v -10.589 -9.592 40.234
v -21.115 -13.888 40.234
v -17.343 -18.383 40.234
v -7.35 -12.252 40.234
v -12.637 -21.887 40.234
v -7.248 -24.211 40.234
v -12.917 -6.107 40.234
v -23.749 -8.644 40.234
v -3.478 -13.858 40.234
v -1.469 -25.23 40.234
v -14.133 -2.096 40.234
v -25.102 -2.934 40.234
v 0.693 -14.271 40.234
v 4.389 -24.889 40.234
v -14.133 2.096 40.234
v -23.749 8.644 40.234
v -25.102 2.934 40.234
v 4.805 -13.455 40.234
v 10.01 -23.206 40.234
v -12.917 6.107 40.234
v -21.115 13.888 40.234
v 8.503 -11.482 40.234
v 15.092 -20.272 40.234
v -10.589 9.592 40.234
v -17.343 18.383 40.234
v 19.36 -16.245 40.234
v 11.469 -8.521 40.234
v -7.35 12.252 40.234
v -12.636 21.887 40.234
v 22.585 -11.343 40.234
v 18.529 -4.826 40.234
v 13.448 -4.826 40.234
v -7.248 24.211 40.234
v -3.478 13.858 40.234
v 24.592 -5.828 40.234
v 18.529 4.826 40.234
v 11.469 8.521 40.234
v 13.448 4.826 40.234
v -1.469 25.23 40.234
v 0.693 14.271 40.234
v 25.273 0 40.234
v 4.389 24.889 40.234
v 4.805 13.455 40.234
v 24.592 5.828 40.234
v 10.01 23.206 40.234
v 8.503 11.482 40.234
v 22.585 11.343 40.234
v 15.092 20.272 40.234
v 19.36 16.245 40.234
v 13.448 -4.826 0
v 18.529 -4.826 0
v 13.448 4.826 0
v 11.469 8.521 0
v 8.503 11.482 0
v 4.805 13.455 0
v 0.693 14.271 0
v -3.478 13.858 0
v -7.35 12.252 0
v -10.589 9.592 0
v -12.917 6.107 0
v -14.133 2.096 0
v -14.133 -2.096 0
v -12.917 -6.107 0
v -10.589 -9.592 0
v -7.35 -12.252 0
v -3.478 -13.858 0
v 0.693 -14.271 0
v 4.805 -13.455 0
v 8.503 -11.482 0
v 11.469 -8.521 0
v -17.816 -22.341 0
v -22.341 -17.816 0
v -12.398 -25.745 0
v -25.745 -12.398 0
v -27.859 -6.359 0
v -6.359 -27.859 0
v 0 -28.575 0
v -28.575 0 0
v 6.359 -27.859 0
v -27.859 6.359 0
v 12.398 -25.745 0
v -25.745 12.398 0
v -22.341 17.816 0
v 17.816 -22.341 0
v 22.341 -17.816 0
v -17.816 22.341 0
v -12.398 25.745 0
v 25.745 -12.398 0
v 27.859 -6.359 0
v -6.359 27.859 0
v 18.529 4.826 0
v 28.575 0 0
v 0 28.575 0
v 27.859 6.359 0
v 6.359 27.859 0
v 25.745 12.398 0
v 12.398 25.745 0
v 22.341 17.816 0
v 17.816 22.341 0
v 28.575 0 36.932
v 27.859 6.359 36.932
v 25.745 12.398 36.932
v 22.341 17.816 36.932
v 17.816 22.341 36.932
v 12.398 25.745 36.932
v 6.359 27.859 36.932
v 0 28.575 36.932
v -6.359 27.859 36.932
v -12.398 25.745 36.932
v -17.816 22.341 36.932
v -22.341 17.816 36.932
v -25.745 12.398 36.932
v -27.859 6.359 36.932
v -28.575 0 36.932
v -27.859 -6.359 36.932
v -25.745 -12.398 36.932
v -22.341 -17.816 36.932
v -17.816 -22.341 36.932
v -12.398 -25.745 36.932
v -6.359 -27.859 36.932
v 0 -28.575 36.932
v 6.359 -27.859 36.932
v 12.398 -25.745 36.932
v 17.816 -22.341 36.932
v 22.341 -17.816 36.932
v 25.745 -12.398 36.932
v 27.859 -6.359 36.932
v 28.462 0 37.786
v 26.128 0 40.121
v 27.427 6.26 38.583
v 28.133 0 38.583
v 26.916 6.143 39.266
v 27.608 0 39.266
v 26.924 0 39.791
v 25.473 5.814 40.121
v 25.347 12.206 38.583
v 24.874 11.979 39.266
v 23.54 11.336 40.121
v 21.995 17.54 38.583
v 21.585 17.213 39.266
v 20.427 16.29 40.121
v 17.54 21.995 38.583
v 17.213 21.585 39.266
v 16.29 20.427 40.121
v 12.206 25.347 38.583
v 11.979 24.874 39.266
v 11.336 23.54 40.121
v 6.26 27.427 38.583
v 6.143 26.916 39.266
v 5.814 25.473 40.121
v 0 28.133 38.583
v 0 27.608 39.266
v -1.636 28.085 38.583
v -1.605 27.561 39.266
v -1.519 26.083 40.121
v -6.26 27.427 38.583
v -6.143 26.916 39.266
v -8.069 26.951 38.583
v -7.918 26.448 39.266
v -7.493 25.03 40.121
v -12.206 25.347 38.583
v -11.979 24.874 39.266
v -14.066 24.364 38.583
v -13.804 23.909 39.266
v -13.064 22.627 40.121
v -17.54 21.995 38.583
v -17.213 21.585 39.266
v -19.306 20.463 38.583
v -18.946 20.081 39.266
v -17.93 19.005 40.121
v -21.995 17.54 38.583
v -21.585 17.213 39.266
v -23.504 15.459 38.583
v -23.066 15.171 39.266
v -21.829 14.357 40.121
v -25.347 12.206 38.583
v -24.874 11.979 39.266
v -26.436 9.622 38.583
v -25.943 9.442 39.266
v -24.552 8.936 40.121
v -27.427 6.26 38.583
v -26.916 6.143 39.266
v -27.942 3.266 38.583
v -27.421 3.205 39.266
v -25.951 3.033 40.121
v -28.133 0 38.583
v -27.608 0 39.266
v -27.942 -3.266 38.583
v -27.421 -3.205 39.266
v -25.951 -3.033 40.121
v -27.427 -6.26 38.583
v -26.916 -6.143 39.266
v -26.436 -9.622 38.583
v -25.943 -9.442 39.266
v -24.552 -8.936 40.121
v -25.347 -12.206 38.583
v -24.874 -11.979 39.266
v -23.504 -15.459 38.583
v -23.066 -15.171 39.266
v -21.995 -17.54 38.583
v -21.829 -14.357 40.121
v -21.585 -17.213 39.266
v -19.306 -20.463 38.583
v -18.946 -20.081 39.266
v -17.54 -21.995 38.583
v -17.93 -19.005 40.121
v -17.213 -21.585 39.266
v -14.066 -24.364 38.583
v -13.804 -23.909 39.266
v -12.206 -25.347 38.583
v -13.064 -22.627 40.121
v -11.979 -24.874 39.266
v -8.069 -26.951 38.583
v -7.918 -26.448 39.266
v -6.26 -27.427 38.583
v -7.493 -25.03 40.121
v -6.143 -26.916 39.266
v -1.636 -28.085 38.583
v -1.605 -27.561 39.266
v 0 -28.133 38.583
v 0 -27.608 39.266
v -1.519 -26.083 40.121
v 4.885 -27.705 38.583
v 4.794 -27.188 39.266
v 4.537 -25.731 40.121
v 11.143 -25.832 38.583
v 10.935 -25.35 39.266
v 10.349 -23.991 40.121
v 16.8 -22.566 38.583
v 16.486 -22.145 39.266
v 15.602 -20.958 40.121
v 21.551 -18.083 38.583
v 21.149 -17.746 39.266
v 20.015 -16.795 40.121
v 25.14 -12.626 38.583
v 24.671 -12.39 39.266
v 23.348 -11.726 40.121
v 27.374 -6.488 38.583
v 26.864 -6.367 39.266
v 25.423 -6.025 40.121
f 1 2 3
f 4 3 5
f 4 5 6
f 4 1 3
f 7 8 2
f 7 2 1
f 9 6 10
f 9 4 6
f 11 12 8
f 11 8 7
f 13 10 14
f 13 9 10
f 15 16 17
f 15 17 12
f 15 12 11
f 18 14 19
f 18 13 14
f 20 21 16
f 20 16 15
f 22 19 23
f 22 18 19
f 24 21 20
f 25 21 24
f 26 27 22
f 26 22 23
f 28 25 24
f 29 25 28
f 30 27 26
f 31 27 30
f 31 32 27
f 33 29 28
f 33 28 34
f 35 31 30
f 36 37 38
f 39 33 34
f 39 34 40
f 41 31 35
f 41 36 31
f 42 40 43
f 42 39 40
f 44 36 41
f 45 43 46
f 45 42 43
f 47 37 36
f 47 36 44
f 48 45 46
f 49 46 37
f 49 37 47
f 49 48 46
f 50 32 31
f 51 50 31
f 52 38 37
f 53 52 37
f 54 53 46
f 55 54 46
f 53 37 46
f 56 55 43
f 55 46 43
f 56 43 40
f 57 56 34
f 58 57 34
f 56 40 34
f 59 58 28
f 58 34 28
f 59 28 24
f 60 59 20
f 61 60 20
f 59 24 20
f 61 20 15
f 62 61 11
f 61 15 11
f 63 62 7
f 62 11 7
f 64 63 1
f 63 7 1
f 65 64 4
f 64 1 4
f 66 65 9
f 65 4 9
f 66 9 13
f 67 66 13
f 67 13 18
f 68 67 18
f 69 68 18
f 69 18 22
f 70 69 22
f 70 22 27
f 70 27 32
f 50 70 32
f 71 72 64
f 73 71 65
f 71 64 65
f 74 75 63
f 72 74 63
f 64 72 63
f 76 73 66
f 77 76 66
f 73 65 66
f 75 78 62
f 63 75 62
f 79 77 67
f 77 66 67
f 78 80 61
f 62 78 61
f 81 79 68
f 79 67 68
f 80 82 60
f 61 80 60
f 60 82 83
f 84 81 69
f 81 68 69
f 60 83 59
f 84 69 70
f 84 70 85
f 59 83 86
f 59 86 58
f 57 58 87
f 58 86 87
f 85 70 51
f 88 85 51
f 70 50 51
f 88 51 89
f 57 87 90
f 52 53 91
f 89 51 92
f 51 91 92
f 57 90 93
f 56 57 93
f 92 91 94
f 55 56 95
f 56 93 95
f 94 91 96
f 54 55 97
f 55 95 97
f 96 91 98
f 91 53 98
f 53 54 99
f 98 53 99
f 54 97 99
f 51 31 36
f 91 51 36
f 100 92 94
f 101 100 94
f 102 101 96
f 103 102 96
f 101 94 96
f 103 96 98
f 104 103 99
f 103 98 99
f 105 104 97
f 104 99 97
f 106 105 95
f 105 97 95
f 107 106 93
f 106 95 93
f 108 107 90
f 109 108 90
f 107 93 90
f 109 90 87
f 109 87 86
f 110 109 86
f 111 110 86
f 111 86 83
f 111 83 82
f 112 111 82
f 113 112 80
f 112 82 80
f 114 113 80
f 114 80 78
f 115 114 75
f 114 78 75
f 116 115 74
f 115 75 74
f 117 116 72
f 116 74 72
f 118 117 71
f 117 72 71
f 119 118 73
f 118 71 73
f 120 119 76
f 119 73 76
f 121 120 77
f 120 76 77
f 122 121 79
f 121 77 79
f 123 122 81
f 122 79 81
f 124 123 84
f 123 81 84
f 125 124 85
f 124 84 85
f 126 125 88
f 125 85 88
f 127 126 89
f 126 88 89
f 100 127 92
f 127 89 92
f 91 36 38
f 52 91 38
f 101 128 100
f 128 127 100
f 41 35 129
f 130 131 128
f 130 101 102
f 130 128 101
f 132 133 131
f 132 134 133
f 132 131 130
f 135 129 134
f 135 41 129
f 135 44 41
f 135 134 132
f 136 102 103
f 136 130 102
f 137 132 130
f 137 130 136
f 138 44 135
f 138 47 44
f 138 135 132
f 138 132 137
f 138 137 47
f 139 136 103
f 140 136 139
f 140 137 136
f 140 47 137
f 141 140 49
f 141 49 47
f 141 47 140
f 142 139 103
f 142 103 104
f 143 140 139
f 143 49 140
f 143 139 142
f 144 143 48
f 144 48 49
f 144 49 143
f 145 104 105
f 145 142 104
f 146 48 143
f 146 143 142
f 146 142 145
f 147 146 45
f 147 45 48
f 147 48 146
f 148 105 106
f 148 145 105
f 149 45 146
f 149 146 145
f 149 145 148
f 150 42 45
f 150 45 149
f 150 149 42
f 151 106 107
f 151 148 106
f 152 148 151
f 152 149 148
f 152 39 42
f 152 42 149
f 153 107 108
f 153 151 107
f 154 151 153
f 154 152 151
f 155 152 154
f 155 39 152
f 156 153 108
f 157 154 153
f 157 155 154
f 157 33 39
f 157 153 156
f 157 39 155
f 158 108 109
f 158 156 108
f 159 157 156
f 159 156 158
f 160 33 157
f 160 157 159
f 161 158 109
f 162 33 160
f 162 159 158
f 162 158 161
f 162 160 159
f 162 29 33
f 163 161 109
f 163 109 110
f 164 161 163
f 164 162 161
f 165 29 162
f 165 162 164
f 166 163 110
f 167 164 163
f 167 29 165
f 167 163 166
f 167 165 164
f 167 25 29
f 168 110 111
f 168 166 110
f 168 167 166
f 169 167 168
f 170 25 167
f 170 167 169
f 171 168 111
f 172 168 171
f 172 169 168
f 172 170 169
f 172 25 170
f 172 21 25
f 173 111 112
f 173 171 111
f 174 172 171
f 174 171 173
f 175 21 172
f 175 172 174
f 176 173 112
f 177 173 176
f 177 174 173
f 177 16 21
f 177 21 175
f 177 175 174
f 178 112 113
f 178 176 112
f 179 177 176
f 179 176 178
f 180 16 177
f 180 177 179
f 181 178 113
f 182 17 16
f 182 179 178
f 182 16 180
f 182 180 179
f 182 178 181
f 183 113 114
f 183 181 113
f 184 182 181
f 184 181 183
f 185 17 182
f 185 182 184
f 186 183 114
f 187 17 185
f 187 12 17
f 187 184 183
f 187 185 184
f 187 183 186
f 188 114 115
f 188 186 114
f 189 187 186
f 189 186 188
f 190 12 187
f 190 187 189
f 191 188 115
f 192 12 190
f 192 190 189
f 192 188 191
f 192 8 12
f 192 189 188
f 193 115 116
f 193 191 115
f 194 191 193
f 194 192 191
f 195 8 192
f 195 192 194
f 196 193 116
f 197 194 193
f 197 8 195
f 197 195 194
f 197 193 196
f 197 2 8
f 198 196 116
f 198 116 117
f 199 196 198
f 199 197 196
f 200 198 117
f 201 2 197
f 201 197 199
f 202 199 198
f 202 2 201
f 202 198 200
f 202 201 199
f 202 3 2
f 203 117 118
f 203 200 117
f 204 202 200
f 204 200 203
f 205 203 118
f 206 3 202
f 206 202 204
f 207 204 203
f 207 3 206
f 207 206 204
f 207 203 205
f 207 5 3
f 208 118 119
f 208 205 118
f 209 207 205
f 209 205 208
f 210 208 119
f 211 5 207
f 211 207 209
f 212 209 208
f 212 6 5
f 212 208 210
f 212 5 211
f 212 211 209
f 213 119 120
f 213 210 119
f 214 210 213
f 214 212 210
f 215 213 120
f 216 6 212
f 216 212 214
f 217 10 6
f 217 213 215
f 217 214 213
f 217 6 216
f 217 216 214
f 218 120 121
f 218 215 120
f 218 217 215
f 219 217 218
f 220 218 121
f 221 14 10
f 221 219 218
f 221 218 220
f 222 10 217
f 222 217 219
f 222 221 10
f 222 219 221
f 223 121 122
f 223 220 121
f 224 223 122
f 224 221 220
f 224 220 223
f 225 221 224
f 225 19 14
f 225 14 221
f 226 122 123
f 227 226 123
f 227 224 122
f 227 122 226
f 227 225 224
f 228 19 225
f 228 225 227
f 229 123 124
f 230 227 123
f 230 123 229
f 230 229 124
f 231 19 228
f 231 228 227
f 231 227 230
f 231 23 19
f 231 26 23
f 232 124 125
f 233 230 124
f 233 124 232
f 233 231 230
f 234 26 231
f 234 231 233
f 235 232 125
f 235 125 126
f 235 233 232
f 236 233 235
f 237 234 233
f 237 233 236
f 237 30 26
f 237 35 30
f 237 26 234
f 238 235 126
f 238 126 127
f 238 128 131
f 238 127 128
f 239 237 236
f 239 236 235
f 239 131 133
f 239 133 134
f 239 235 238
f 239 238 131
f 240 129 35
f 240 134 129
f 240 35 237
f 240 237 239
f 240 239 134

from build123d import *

# Parameters (mm, degrees)
F0_R     = 28.575
F1_DEPTH = 40.2336
F2_R     = 3.302
F4_DEPTH = 40.2336


with BuildPart() as f1:
    # F0 (on Top) → F1 (new body)
    with BuildSketch(Plane.XY):
        Circle(F0_R)
    extrude(amount=F1_DEPTH)

    # F2
    f2_edges = [f1.edges().sort_by_distance(p)[0] for p in [
        (-28.575, 0, 40.2336),
    ]]
    fillet(f2_edges, radius=F2_R)

    # F3 (on face) → F4 (cut, through all)
    with BuildSketch(Plane.XY.offset(40.2336)):
        with BuildLine():
            Line((18.5293, 4.826), (13.447765, 4.826))
            ThreePointArc((13.447765, 4.826), (-14.2875, 0), (13.447765, -4.826))
            Line((13.447765, -4.826), (18.5293, -4.826))
            Line((18.5293, -4.826), (18.5293, 4.826))
        make_face()
    extrude(amount=-F4_DEPTH, mode=Mode.SUBTRACT)


solid = f1.part
